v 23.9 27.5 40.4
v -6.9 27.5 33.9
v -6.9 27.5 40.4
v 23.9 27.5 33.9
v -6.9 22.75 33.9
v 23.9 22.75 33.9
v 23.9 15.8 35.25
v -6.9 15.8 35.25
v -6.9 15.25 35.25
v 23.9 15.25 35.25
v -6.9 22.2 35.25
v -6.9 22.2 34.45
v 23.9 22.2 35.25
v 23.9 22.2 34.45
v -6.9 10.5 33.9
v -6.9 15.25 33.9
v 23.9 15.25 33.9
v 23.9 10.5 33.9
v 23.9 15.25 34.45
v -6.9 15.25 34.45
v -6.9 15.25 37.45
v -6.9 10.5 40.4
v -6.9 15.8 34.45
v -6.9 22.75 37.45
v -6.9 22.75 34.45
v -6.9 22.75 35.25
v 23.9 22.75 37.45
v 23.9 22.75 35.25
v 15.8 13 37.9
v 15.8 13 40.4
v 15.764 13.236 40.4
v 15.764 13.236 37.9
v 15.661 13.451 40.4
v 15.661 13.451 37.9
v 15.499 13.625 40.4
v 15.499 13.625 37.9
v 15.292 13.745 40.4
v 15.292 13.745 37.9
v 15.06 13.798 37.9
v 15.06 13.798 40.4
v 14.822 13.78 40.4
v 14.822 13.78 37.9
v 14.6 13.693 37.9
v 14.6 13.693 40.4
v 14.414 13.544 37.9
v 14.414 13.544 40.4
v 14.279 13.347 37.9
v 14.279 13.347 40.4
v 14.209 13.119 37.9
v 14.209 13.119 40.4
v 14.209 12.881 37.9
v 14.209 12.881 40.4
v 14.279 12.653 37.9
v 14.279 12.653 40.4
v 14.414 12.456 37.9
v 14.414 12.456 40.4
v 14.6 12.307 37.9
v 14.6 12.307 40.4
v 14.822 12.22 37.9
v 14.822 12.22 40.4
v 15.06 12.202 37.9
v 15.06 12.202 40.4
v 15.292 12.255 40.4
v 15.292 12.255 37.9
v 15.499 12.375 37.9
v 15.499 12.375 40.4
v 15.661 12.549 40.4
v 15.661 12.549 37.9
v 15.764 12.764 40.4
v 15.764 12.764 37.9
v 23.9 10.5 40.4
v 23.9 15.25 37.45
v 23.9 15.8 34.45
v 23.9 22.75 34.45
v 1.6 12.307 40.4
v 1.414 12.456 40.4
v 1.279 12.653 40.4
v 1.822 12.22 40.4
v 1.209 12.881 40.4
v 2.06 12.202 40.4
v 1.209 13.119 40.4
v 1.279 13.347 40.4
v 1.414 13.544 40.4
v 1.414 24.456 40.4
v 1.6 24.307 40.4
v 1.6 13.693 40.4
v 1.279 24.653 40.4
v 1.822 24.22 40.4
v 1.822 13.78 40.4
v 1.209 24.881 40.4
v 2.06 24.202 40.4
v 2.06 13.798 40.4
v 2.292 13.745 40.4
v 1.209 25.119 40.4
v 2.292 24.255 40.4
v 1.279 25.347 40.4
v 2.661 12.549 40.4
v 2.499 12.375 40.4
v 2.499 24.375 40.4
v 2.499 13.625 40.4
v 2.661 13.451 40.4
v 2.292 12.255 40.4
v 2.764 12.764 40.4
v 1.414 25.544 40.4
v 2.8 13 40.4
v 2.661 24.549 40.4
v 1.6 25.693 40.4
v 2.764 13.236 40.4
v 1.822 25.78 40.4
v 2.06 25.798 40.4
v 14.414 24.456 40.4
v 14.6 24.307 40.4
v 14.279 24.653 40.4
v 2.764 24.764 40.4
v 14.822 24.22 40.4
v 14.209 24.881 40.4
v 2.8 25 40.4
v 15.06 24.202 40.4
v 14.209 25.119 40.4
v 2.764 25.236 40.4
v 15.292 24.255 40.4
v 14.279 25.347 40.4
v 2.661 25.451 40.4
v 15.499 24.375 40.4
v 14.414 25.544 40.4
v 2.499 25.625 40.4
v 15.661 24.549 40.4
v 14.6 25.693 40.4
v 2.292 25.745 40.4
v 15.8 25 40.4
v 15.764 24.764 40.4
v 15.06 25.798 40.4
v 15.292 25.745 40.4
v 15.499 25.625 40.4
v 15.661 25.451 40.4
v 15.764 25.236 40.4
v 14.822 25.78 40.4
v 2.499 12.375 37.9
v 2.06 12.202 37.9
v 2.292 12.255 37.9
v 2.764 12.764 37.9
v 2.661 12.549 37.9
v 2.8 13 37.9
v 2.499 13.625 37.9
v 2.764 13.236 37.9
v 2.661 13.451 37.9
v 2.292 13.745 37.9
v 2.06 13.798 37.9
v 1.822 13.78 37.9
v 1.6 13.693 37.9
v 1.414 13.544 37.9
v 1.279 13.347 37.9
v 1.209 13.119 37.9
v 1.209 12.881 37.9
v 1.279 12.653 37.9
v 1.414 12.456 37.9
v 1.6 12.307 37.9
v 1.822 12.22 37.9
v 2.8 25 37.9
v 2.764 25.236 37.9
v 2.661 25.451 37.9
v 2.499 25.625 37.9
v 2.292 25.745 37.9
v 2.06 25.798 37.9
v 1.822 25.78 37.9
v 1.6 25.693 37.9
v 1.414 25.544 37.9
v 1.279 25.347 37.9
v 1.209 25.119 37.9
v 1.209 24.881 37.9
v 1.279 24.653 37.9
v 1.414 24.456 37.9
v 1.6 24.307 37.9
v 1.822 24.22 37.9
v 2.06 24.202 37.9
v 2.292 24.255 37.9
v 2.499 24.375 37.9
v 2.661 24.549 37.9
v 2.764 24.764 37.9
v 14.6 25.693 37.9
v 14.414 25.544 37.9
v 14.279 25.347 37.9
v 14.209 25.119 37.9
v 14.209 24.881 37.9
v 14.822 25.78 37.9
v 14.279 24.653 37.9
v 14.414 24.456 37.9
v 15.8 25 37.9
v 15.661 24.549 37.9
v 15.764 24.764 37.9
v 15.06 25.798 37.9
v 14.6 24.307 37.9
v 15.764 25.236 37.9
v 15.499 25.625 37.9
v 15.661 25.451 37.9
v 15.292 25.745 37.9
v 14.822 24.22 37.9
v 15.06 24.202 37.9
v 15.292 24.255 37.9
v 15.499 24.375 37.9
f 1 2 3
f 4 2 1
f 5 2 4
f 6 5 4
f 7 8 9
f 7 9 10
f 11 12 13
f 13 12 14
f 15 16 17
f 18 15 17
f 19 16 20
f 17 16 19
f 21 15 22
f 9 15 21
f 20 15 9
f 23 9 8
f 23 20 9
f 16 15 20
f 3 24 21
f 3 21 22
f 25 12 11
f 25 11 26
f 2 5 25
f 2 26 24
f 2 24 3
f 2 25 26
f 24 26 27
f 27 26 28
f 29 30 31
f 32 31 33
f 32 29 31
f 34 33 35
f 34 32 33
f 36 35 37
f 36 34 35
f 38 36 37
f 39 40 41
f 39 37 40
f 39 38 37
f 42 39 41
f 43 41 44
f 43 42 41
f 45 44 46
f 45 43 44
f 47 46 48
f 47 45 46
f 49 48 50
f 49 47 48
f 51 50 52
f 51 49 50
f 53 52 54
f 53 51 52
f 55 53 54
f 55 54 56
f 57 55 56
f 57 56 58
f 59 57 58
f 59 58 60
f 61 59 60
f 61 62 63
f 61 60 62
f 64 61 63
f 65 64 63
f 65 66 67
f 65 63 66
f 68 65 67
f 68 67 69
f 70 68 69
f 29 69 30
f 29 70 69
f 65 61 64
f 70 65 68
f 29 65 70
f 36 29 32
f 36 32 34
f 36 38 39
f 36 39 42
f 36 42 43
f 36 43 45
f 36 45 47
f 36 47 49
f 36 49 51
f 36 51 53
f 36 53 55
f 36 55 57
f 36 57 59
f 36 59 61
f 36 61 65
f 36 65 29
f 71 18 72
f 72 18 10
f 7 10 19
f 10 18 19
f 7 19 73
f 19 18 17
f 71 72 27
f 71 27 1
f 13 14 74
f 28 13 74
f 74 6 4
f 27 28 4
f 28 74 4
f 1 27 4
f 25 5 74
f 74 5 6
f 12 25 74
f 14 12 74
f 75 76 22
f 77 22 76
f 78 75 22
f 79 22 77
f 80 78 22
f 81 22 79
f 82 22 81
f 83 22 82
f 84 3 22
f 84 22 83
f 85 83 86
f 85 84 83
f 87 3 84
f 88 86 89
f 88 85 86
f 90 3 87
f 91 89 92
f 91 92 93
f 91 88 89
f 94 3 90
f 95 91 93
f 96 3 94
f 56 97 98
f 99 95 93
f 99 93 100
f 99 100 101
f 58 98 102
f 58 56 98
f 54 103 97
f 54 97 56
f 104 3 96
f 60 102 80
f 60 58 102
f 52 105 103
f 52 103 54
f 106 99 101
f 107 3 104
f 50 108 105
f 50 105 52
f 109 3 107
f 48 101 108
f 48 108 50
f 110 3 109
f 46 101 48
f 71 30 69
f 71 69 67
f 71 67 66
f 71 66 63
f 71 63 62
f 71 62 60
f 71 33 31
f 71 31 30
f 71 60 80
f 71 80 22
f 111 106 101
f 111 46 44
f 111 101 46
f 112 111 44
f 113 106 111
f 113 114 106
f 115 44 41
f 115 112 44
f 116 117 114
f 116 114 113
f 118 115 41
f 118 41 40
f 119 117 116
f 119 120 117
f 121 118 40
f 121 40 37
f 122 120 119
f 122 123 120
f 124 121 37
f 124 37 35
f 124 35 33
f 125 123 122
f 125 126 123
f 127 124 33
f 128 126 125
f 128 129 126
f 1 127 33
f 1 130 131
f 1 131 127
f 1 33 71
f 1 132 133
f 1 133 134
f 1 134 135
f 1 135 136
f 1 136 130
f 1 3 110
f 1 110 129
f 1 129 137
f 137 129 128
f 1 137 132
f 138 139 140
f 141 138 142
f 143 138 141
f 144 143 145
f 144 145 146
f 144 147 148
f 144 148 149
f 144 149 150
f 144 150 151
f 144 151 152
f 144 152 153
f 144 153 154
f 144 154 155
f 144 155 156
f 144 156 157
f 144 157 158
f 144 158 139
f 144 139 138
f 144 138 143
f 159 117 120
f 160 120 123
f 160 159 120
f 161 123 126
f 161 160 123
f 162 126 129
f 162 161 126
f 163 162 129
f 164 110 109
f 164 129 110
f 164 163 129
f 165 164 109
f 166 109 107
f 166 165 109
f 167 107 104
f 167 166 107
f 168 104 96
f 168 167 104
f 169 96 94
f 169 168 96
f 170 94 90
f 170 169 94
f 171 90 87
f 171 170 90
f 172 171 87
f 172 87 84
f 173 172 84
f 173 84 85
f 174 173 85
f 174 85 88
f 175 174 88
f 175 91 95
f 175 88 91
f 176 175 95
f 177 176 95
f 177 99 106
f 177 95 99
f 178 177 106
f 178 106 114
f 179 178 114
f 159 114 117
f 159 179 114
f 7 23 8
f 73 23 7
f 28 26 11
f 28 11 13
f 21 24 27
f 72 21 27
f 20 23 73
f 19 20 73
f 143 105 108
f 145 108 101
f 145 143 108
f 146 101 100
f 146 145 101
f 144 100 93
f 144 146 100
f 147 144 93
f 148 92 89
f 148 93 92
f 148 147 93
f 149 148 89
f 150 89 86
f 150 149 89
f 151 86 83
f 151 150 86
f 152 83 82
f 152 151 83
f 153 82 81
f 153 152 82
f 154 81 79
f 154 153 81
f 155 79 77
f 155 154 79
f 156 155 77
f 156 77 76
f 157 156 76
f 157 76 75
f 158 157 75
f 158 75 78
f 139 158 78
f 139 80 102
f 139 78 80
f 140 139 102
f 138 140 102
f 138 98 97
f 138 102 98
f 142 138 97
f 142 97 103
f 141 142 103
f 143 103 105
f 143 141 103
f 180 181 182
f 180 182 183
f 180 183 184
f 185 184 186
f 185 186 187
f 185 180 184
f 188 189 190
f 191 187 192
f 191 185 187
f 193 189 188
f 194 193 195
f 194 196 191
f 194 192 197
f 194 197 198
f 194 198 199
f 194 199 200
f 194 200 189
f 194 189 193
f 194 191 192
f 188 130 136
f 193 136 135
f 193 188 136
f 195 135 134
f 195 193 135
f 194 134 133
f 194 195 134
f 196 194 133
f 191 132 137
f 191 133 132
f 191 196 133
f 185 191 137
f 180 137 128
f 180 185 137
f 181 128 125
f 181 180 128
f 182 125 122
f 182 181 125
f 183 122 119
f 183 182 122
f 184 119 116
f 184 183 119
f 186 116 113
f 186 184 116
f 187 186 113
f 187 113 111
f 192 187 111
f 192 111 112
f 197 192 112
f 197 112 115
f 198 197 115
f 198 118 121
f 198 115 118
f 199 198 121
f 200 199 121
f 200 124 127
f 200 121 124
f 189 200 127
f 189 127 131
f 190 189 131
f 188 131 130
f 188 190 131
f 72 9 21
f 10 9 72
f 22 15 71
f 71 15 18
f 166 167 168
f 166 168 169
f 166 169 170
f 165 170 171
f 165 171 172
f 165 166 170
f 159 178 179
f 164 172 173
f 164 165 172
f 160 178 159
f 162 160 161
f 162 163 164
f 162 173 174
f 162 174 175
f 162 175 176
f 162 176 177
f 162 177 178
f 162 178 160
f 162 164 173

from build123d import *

# Parameters (mm, degrees)
MGN7H_START                                 = 33.9
MGN7H_30_8_X_17_MM_BLOCK_PROFILE_W          = 30.8
MGN7H_30_8_X_17_MM_BLOCK_PROFILE_H          = 17
MGN7H_30_8_X_17_MM_BLOCK_DEPTH              = 6.5
RAIL_START                                  = 33.85
RAIL_SLOT_AND_RUNNING_CLEARANCE_PROFILE_W   = 31
RAIL_SLOT_AND_RUNNING_CLEARANCE_PROFILE_H   = 7.5
RAIL_SLOT_AND_RUNNING_CLEARANCE_DEPTH       = 3.6
NOMINAL_START                               = 34.45
NOMINAL_RACEWAY_SHOULDERS_PROFILE_W         = 30.8
NOMINAL_RACEWAY_SHOULDERS_PROFILE_H         = 0.65
NOMINAL_RACEWAY_SHOULDERS_DEPTH             = 0.8
M2_START                                    = 37.9
M2_X_2_5_BLOCK_HOLES_13_X_12_MM_PITCH_PR_R  = 0.8
M2_X_2_5_BLOCK_HOLES_13_X_12_MM_PITCH_DEPTH = 2.6


with BuildPart() as part:
    # MGN7H 30.8 x 17 mm block profile → MGN7H 30.8 x 17 mm block (new body)
    with BuildSketch(Plane.XY.offset(MGN7H_START)):
        with Locations((8.5, 19)):
            Rectangle(MGN7H_30_8_X_17_MM_BLOCK_PROFILE_W, MGN7H_30_8_X_17_MM_BLOCK_PROFILE_H)
    extrude(amount=MGN7H_30_8_X_17_MM_BLOCK_DEPTH)

    # Rail slot and running clearance profile → Rail slot and running clearance (cut)
    with BuildSketch(Plane.XY.offset(RAIL_START)):
        with Locations((8.5, 19)):
            Rectangle(RAIL_SLOT_AND_RUNNING_CLEARANCE_PROFILE_W, RAIL_SLOT_AND_RUNNING_CLEARANCE_PROFILE_H)
    extrude(amount=RAIL_SLOT_AND_RUNNING_CLEARANCE_DEPTH, mode=Mode.SUBTRACT)

    # Nominal raceway shoulders profile → Nominal raceway shoulders (add)
    with BuildSketch(Plane.XY.offset(NOMINAL_START)):
        with Locations((8.5, 15.475)):
            Rectangle(NOMINAL_RACEWAY_SHOULDERS_PROFILE_W, NOMINAL_RACEWAY_SHOULDERS_PROFILE_H)
        with Locations((8.5, 22.525)):
            Rectangle(NOMINAL_RACEWAY_SHOULDERS_PROFILE_W, NOMINAL_RACEWAY_SHOULDERS_PROFILE_H)
    extrude(amount=NOMINAL_RACEWAY_SHOULDERS_DEPTH)

    # M2 x 2.5 block holes 13 x 12 mm pitch profile → M2 x 2.5 block holes 13 x 12 mm pitch (cut)
    with BuildSketch(Plane.XY.offset(M2_START)):
        with Locations((2, 13)):
            Circle(M2_X_2_5_BLOCK_HOLES_13_X_12_MM_PITCH_PR_R)
        with Locations((2, 25)):
            Circle(M2_X_2_5_BLOCK_HOLES_13_X_12_MM_PITCH_PR_R)
        with Locations((15, 13)):
            Circle(M2_X_2_5_BLOCK_HOLES_13_X_12_MM_PITCH_PR_R)
        with Locations((15, 25)):
            Circle(M2_X_2_5_BLOCK_HOLES_13_X_12_MM_PITCH_PR_R)
    extrude(amount=M2_X_2_5_BLOCK_HOLES_13_X_12_MM_PITCH_DEPTH, mode=Mode.SUBTRACT)


solid = part.part
